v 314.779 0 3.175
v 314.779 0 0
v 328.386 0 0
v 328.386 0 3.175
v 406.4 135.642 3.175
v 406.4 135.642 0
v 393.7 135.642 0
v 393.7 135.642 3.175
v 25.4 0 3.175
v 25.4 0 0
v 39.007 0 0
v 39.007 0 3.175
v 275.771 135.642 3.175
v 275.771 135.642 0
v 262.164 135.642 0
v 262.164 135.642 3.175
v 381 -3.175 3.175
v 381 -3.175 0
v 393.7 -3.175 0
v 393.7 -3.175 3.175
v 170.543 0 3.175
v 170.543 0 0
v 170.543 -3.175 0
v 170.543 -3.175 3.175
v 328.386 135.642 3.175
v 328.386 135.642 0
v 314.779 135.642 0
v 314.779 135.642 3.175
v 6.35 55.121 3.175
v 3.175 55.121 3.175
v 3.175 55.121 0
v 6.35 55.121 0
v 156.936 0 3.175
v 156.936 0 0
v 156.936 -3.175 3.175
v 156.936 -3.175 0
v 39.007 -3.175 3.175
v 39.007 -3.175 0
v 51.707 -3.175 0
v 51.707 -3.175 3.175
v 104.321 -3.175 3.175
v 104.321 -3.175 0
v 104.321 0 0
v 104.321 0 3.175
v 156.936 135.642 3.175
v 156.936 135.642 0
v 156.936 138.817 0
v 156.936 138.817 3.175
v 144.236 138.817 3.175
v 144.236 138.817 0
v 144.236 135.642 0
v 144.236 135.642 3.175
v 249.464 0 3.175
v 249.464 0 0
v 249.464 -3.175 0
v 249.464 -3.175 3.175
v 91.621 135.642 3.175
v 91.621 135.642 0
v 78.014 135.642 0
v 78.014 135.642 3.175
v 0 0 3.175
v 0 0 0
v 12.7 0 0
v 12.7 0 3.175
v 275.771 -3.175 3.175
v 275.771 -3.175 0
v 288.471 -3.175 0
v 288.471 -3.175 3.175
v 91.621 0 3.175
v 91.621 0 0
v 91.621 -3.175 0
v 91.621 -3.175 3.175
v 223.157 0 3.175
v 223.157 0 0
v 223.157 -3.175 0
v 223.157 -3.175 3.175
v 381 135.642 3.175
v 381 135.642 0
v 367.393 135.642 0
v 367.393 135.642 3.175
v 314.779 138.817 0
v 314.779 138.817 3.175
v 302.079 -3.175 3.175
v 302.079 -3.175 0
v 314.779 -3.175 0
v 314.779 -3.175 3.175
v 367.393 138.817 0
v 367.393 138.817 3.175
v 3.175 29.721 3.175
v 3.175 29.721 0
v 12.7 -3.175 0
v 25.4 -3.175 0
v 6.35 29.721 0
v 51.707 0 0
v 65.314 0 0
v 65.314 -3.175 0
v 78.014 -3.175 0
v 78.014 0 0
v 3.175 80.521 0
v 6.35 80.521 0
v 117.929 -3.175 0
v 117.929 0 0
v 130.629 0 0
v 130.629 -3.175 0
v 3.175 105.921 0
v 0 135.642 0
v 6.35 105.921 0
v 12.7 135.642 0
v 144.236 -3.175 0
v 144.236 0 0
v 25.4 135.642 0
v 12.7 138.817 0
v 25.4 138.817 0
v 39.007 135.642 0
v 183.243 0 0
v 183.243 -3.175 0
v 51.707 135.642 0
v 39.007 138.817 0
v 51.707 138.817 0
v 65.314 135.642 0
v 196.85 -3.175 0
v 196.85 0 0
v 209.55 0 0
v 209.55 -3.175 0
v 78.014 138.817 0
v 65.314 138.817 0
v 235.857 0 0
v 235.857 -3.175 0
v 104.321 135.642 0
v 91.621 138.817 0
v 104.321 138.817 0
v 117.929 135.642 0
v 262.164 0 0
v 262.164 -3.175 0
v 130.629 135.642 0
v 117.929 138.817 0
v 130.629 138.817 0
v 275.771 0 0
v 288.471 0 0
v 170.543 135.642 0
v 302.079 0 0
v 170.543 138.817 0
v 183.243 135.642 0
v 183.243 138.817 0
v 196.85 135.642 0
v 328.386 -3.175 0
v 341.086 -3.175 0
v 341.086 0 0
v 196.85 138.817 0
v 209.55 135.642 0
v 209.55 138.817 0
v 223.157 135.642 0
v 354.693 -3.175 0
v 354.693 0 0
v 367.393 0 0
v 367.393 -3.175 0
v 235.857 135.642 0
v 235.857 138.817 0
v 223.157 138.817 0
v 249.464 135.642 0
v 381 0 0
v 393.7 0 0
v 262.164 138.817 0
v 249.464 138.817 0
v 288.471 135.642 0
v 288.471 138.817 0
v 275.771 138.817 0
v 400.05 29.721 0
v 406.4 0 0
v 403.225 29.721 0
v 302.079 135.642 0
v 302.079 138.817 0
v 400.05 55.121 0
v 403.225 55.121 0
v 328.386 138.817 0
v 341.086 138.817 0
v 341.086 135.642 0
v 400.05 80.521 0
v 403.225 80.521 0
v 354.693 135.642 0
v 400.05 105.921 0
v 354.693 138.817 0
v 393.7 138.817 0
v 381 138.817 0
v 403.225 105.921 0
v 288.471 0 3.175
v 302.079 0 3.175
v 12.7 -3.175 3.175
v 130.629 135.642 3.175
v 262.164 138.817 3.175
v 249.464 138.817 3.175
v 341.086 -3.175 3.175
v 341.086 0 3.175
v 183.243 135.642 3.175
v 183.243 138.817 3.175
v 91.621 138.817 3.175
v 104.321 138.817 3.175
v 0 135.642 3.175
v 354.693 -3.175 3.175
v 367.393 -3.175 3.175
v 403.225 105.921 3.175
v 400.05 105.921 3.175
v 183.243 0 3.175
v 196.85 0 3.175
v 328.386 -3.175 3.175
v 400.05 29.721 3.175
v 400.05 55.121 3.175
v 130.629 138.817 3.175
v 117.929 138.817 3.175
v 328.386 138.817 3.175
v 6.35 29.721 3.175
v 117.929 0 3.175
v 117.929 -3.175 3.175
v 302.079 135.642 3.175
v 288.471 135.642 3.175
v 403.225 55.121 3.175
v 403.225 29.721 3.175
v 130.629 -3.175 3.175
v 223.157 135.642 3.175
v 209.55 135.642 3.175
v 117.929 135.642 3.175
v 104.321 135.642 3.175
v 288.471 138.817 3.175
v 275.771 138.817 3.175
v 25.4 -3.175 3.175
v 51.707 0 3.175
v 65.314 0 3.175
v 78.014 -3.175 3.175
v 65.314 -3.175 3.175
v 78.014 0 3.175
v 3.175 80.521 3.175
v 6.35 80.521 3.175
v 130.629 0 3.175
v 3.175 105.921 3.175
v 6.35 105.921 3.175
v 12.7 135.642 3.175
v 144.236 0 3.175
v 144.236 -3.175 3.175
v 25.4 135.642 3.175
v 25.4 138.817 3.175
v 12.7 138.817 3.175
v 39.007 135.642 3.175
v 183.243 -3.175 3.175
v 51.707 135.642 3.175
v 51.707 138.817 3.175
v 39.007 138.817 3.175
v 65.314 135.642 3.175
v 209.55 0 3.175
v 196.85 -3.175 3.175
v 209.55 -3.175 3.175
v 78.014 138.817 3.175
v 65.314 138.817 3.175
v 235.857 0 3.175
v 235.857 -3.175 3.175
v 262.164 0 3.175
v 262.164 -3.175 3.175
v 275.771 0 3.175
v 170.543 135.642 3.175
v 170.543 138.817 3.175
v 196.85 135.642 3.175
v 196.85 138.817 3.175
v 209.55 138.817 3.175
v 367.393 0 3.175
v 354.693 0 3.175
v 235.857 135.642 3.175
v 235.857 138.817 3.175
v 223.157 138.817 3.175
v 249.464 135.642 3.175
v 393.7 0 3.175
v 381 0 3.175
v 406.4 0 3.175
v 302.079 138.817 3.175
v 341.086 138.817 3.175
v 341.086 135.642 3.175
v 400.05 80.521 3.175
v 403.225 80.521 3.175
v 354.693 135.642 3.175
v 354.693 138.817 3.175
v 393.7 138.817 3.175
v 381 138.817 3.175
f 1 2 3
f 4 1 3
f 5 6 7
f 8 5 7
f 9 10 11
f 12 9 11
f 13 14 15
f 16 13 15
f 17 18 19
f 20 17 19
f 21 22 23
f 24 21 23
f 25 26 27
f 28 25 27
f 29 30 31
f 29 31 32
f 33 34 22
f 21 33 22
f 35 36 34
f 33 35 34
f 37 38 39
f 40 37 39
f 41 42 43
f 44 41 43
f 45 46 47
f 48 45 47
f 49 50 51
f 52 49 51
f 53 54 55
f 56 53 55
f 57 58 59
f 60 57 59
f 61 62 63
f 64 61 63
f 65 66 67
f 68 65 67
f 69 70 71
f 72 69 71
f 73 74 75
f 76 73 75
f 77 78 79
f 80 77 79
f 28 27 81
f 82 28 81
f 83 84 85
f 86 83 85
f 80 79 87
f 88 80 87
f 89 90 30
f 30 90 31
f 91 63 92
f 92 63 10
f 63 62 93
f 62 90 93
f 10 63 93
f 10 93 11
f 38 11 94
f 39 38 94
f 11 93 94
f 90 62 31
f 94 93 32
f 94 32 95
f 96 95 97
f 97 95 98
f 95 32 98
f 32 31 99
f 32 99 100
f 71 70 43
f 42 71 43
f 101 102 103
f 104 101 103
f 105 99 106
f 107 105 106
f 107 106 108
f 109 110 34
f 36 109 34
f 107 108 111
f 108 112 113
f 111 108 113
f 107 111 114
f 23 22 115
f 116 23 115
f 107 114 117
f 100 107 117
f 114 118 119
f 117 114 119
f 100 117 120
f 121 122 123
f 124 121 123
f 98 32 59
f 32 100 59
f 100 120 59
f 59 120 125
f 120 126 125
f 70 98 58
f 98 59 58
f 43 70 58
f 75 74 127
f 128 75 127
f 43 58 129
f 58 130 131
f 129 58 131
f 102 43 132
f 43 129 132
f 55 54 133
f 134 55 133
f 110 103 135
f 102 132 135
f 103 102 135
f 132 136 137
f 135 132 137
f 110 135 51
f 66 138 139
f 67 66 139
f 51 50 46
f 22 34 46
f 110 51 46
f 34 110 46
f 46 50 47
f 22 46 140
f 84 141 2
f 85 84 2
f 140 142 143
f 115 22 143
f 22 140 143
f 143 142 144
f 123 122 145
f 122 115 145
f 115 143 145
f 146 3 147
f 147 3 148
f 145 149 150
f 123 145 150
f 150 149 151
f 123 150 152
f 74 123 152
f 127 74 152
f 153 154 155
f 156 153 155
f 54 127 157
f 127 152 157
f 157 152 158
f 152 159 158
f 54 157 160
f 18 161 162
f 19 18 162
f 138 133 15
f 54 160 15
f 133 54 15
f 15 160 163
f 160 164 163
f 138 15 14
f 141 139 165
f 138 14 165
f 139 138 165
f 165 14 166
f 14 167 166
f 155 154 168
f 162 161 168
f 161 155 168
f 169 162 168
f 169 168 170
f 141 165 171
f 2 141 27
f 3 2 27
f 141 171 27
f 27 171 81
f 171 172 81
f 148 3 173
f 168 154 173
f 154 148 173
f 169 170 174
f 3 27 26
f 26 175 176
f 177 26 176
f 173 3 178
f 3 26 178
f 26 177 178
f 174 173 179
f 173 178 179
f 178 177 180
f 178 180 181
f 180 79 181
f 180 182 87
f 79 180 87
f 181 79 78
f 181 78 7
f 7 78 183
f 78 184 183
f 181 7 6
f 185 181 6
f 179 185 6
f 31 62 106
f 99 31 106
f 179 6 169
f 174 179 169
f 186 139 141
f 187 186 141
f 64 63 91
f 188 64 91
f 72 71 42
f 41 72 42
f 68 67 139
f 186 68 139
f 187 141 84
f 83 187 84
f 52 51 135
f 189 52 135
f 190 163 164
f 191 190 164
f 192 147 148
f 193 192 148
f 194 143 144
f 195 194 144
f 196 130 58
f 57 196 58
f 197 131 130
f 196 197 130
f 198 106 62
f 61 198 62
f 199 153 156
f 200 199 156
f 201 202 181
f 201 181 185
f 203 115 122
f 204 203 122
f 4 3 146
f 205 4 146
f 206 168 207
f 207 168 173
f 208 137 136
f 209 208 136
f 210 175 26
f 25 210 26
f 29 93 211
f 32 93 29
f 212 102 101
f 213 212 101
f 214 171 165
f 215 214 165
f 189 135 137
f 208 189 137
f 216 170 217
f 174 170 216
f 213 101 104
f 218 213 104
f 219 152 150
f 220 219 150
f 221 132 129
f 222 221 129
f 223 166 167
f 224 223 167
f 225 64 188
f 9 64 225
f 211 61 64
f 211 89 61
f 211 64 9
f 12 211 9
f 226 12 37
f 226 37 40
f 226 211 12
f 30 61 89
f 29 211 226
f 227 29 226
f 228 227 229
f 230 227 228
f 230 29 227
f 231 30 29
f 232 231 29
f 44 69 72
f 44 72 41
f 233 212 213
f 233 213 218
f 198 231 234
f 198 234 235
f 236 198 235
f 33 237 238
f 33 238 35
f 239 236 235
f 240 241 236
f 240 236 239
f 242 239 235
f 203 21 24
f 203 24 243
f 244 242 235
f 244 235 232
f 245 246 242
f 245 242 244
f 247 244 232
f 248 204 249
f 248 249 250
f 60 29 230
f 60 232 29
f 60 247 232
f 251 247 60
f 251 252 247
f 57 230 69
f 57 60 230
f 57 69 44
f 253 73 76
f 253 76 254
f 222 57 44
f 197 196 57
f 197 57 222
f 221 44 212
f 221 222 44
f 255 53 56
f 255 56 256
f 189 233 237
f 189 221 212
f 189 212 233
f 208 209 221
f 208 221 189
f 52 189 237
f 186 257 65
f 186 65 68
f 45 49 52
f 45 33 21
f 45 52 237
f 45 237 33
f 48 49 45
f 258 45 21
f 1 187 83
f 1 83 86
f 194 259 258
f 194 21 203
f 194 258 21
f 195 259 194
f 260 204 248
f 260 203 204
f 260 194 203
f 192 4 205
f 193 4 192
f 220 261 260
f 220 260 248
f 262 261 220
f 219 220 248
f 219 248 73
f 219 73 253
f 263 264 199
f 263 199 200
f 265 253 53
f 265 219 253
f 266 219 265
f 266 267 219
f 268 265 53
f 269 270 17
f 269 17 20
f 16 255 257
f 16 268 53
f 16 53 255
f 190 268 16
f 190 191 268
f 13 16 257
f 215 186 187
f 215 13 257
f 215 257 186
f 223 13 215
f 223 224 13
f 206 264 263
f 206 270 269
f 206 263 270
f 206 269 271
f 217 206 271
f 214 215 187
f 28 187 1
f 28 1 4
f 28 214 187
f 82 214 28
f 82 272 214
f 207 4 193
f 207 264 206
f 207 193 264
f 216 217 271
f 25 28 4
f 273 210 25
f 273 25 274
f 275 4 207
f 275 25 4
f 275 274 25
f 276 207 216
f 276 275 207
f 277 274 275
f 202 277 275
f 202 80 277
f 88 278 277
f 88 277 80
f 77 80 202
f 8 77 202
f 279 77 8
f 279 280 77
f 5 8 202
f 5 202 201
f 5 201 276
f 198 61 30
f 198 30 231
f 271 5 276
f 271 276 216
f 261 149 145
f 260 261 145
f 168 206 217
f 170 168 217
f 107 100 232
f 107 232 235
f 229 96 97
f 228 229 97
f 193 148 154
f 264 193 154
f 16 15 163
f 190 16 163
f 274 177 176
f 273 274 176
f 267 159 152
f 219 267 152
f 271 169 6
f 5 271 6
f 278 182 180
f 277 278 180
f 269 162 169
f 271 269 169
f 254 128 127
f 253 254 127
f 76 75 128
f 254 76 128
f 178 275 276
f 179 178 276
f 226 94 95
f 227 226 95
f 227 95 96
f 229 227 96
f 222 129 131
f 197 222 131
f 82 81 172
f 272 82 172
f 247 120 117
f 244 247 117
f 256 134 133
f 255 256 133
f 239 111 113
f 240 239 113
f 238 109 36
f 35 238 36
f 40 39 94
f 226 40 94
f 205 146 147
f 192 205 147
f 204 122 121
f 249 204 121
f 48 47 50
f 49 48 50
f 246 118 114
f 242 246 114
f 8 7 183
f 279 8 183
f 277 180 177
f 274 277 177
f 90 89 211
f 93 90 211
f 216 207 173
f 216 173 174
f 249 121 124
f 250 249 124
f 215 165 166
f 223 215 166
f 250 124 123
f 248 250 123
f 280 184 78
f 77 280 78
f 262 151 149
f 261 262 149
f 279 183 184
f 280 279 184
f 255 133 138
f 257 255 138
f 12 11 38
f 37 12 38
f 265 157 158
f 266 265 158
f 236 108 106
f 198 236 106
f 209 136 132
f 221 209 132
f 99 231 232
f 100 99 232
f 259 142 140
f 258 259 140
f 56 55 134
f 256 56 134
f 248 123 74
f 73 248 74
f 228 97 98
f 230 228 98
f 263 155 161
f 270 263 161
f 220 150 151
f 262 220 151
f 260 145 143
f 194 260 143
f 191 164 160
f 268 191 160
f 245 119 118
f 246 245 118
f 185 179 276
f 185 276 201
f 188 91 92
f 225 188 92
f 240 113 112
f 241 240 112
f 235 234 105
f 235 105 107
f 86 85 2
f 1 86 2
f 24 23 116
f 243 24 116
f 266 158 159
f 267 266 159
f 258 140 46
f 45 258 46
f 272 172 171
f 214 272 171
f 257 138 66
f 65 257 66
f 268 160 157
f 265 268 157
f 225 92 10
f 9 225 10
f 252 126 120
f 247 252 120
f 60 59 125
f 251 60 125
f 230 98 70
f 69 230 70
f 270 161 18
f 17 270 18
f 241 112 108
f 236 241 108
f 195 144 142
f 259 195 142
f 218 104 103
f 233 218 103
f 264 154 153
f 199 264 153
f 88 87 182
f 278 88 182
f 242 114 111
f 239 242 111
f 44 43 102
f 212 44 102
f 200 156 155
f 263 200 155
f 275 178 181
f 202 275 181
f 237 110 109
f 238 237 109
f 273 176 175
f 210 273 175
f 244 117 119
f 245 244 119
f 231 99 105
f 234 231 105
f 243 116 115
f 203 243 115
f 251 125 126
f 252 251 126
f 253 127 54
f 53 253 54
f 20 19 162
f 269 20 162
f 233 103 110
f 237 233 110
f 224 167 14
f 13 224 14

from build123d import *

# Parameters (mm, degrees)
SKETCH1_W           = 3.175
SKETCH1_H           = 25.4
BOSS_EXTRUDE1_DEPTH = 3.175


with BuildPart() as part:
    # Sketch1 → Boss-Extrude1 (new body)
    with BuildSketch(Plane.XY):
        Polygon((65.314285714, 135.64235), (65.214285714, 135.64235), (51.807142857, 135.64235), (51.707142857, 135.64235), (51.707142857, 138.81735), (39.007142857, 138.81735), (39.007142857, 135.64235), (38.907142857, 135.64235), (25.5, 135.64235), (25.4, 135.64235), (25.4, 138.81735), (12.7, 138.81735), (12.7, 135.64235), (12.6, 135.64235), (0, 135.64235), (0, 0), (12.6, 0), (12.7, 0), (12.7, -3.175), (25.4, -3.175), (25.4, 0), (25.5, 0), (38.907142857, 0), (39.007142857, 0), (39.007142857, -3.175), (51.707142857, -3.175), (51.707142857, 0), (51.807142857, 0), (65.214285714, 0), (65.314285714, 0), (65.314285714, -3.175), (78.014285714, -3.175), (78.014285714, 0), (78.114285714, 0), (91.521428571, 0), (91.621428571, 0), (91.621428571, -3.175), (104.321428571, -3.175), (104.321428571, 0), (104.421428571, 0), (117.828571429, 0), (117.928571429, 0), (117.928571429, -3.175), (130.628571429, -3.175), (130.628571429, 0), (130.728571429, 0), (144.135714286, 0), (144.235714286, 0), (144.235714286, -3.175), (156.935714286, -3.175), (156.935714286, 0), (157.035714286, 0), (170.442857143, 0), (170.542857143, 0), (170.542857143, -3.175), (183.242857143, -3.175), (183.242857143, 0), (183.342857143, 0), (196.75, 0), (196.85, 0), (196.85, -3.175), (209.55, -3.175), (209.55, 0), (209.65, 0), (223.057142857, 0), (223.157142857, 0), (223.157142857, -3.175), (235.857142857, -3.175), (235.857142857, 0), (235.957142857, 0), (249.364285714, 0), (249.464285714, 0), (249.464285714, -3.175), (262.164285714, -3.175), (262.164285714, 0), (262.264285714, 0), (275.671428571, 0), (275.771428571, 0), (275.771428571, -3.175), (288.471428571, -3.175), (288.471428571, 0), (288.571428571, 0), (301.978571429, 0), (302.078571429, 0), (302.078571429, -3.175), (314.778571429, -3.175), (314.778571429, 0), (314.878571429, 0), (328.285714286, 0), (328.385714286, 0), (328.385714286, -3.175), (341.085714286, -3.175), (341.085714286, 0), (341.185714286, 0), (354.592857143, 0), (354.692857143, 0), (354.692857143, -3.175), (367.392857143, -3.175), (367.392857143, 0), (367.492857143, 0), (380.9, 0), (381, 0), (381, -3.175), (393.7, -3.175), (393.7, 0), (393.8, 0), (406.4, 0), (406.4, 135.64235), (393.8, 135.64235), (393.7, 135.64235), (393.7, 138.81735), (381, 138.81735), (381, 135.64235), (380.9, 135.64235), (367.492857143, 135.64235), (367.392857143, 135.64235), (367.392857143, 138.81735), (354.692857143, 138.81735), (354.692857143, 135.64235), (354.592857143, 135.64235), (341.185714286, 135.64235), (341.085714286, 135.64235), (341.085714286, 138.81735), (328.385714286, 138.81735), (328.385714286, 135.64235), (328.285714286, 135.64235), (314.878571429, 135.64235), (314.778571429, 135.64235), (314.778571429, 138.81735), (302.078571429, 138.81735), (302.078571429, 135.64235), (301.978571429, 135.64235), (288.571428571, 135.64235), (288.471428571, 135.64235), (288.471428571, 138.81735), (275.771428571, 138.81735), (275.771428571, 135.64235), (275.671428571, 135.64235), (262.264285714, 135.64235), (262.164285714, 135.64235), (262.164285714, 138.81735), (249.464285714, 138.81735), (249.464285714, 135.64235), (249.364285714, 135.64235), (235.957142857, 135.64235), (235.857142857, 135.64235), (235.857142857, 138.81735), (223.157142857, 138.81735), (223.157142857, 135.64235), (223.057142857, 135.64235), (209.65, 135.64235), (209.55, 135.64235), (209.55, 138.81735), (196.85, 138.81735), (196.85, 135.64235), (196.75, 135.64235), (183.342857143, 135.64235), (183.242857143, 135.64235), (183.242857143, 138.81735), (170.542857143, 138.81735), (170.542857143, 135.64235), (170.442857143, 135.64235), (157.035714286, 135.64235), (156.935714286, 135.64235), (156.935714286, 138.81735), (144.235714286, 138.81735), (144.235714286, 135.64235), (144.135714286, 135.64235), (130.728571429, 135.64235), (130.628571429, 135.64235), (130.628571429, 138.81735), (117.928571429, 138.81735), (117.928571429, 135.64235), (117.828571429, 135.64235), (104.421428571, 135.64235), (104.321428571, 135.64235), (104.321428571, 138.81735), (91.621428571, 138.81735), (91.621428571, 135.64235), (91.521428571, 135.64235), (78.114285714, 135.64235), (78.014285714, 135.64235), (78.014285714, 138.81735), (65.314285714, 138.81735), align=None)
        with Locations((401.6375, 93.221175)):
            Rectangle(SKETCH1_W, SKETCH1_H, mode=Mode.SUBTRACT)
        with Locations((401.6375, 42.421175)):
            Rectangle(SKETCH1_W, SKETCH1_H, mode=Mode.SUBTRACT)
        with Locations((4.7625, 93.221175)):
            Rectangle(SKETCH1_W, SKETCH1_H, mode=Mode.SUBTRACT)
        with Locations((4.7625, 42.421175)):
            Rectangle(SKETCH1_W, SKETCH1_H, mode=Mode.SUBTRACT)
    extrude(amount=BOSS_EXTRUDE1_DEPTH)


solid = part.part
